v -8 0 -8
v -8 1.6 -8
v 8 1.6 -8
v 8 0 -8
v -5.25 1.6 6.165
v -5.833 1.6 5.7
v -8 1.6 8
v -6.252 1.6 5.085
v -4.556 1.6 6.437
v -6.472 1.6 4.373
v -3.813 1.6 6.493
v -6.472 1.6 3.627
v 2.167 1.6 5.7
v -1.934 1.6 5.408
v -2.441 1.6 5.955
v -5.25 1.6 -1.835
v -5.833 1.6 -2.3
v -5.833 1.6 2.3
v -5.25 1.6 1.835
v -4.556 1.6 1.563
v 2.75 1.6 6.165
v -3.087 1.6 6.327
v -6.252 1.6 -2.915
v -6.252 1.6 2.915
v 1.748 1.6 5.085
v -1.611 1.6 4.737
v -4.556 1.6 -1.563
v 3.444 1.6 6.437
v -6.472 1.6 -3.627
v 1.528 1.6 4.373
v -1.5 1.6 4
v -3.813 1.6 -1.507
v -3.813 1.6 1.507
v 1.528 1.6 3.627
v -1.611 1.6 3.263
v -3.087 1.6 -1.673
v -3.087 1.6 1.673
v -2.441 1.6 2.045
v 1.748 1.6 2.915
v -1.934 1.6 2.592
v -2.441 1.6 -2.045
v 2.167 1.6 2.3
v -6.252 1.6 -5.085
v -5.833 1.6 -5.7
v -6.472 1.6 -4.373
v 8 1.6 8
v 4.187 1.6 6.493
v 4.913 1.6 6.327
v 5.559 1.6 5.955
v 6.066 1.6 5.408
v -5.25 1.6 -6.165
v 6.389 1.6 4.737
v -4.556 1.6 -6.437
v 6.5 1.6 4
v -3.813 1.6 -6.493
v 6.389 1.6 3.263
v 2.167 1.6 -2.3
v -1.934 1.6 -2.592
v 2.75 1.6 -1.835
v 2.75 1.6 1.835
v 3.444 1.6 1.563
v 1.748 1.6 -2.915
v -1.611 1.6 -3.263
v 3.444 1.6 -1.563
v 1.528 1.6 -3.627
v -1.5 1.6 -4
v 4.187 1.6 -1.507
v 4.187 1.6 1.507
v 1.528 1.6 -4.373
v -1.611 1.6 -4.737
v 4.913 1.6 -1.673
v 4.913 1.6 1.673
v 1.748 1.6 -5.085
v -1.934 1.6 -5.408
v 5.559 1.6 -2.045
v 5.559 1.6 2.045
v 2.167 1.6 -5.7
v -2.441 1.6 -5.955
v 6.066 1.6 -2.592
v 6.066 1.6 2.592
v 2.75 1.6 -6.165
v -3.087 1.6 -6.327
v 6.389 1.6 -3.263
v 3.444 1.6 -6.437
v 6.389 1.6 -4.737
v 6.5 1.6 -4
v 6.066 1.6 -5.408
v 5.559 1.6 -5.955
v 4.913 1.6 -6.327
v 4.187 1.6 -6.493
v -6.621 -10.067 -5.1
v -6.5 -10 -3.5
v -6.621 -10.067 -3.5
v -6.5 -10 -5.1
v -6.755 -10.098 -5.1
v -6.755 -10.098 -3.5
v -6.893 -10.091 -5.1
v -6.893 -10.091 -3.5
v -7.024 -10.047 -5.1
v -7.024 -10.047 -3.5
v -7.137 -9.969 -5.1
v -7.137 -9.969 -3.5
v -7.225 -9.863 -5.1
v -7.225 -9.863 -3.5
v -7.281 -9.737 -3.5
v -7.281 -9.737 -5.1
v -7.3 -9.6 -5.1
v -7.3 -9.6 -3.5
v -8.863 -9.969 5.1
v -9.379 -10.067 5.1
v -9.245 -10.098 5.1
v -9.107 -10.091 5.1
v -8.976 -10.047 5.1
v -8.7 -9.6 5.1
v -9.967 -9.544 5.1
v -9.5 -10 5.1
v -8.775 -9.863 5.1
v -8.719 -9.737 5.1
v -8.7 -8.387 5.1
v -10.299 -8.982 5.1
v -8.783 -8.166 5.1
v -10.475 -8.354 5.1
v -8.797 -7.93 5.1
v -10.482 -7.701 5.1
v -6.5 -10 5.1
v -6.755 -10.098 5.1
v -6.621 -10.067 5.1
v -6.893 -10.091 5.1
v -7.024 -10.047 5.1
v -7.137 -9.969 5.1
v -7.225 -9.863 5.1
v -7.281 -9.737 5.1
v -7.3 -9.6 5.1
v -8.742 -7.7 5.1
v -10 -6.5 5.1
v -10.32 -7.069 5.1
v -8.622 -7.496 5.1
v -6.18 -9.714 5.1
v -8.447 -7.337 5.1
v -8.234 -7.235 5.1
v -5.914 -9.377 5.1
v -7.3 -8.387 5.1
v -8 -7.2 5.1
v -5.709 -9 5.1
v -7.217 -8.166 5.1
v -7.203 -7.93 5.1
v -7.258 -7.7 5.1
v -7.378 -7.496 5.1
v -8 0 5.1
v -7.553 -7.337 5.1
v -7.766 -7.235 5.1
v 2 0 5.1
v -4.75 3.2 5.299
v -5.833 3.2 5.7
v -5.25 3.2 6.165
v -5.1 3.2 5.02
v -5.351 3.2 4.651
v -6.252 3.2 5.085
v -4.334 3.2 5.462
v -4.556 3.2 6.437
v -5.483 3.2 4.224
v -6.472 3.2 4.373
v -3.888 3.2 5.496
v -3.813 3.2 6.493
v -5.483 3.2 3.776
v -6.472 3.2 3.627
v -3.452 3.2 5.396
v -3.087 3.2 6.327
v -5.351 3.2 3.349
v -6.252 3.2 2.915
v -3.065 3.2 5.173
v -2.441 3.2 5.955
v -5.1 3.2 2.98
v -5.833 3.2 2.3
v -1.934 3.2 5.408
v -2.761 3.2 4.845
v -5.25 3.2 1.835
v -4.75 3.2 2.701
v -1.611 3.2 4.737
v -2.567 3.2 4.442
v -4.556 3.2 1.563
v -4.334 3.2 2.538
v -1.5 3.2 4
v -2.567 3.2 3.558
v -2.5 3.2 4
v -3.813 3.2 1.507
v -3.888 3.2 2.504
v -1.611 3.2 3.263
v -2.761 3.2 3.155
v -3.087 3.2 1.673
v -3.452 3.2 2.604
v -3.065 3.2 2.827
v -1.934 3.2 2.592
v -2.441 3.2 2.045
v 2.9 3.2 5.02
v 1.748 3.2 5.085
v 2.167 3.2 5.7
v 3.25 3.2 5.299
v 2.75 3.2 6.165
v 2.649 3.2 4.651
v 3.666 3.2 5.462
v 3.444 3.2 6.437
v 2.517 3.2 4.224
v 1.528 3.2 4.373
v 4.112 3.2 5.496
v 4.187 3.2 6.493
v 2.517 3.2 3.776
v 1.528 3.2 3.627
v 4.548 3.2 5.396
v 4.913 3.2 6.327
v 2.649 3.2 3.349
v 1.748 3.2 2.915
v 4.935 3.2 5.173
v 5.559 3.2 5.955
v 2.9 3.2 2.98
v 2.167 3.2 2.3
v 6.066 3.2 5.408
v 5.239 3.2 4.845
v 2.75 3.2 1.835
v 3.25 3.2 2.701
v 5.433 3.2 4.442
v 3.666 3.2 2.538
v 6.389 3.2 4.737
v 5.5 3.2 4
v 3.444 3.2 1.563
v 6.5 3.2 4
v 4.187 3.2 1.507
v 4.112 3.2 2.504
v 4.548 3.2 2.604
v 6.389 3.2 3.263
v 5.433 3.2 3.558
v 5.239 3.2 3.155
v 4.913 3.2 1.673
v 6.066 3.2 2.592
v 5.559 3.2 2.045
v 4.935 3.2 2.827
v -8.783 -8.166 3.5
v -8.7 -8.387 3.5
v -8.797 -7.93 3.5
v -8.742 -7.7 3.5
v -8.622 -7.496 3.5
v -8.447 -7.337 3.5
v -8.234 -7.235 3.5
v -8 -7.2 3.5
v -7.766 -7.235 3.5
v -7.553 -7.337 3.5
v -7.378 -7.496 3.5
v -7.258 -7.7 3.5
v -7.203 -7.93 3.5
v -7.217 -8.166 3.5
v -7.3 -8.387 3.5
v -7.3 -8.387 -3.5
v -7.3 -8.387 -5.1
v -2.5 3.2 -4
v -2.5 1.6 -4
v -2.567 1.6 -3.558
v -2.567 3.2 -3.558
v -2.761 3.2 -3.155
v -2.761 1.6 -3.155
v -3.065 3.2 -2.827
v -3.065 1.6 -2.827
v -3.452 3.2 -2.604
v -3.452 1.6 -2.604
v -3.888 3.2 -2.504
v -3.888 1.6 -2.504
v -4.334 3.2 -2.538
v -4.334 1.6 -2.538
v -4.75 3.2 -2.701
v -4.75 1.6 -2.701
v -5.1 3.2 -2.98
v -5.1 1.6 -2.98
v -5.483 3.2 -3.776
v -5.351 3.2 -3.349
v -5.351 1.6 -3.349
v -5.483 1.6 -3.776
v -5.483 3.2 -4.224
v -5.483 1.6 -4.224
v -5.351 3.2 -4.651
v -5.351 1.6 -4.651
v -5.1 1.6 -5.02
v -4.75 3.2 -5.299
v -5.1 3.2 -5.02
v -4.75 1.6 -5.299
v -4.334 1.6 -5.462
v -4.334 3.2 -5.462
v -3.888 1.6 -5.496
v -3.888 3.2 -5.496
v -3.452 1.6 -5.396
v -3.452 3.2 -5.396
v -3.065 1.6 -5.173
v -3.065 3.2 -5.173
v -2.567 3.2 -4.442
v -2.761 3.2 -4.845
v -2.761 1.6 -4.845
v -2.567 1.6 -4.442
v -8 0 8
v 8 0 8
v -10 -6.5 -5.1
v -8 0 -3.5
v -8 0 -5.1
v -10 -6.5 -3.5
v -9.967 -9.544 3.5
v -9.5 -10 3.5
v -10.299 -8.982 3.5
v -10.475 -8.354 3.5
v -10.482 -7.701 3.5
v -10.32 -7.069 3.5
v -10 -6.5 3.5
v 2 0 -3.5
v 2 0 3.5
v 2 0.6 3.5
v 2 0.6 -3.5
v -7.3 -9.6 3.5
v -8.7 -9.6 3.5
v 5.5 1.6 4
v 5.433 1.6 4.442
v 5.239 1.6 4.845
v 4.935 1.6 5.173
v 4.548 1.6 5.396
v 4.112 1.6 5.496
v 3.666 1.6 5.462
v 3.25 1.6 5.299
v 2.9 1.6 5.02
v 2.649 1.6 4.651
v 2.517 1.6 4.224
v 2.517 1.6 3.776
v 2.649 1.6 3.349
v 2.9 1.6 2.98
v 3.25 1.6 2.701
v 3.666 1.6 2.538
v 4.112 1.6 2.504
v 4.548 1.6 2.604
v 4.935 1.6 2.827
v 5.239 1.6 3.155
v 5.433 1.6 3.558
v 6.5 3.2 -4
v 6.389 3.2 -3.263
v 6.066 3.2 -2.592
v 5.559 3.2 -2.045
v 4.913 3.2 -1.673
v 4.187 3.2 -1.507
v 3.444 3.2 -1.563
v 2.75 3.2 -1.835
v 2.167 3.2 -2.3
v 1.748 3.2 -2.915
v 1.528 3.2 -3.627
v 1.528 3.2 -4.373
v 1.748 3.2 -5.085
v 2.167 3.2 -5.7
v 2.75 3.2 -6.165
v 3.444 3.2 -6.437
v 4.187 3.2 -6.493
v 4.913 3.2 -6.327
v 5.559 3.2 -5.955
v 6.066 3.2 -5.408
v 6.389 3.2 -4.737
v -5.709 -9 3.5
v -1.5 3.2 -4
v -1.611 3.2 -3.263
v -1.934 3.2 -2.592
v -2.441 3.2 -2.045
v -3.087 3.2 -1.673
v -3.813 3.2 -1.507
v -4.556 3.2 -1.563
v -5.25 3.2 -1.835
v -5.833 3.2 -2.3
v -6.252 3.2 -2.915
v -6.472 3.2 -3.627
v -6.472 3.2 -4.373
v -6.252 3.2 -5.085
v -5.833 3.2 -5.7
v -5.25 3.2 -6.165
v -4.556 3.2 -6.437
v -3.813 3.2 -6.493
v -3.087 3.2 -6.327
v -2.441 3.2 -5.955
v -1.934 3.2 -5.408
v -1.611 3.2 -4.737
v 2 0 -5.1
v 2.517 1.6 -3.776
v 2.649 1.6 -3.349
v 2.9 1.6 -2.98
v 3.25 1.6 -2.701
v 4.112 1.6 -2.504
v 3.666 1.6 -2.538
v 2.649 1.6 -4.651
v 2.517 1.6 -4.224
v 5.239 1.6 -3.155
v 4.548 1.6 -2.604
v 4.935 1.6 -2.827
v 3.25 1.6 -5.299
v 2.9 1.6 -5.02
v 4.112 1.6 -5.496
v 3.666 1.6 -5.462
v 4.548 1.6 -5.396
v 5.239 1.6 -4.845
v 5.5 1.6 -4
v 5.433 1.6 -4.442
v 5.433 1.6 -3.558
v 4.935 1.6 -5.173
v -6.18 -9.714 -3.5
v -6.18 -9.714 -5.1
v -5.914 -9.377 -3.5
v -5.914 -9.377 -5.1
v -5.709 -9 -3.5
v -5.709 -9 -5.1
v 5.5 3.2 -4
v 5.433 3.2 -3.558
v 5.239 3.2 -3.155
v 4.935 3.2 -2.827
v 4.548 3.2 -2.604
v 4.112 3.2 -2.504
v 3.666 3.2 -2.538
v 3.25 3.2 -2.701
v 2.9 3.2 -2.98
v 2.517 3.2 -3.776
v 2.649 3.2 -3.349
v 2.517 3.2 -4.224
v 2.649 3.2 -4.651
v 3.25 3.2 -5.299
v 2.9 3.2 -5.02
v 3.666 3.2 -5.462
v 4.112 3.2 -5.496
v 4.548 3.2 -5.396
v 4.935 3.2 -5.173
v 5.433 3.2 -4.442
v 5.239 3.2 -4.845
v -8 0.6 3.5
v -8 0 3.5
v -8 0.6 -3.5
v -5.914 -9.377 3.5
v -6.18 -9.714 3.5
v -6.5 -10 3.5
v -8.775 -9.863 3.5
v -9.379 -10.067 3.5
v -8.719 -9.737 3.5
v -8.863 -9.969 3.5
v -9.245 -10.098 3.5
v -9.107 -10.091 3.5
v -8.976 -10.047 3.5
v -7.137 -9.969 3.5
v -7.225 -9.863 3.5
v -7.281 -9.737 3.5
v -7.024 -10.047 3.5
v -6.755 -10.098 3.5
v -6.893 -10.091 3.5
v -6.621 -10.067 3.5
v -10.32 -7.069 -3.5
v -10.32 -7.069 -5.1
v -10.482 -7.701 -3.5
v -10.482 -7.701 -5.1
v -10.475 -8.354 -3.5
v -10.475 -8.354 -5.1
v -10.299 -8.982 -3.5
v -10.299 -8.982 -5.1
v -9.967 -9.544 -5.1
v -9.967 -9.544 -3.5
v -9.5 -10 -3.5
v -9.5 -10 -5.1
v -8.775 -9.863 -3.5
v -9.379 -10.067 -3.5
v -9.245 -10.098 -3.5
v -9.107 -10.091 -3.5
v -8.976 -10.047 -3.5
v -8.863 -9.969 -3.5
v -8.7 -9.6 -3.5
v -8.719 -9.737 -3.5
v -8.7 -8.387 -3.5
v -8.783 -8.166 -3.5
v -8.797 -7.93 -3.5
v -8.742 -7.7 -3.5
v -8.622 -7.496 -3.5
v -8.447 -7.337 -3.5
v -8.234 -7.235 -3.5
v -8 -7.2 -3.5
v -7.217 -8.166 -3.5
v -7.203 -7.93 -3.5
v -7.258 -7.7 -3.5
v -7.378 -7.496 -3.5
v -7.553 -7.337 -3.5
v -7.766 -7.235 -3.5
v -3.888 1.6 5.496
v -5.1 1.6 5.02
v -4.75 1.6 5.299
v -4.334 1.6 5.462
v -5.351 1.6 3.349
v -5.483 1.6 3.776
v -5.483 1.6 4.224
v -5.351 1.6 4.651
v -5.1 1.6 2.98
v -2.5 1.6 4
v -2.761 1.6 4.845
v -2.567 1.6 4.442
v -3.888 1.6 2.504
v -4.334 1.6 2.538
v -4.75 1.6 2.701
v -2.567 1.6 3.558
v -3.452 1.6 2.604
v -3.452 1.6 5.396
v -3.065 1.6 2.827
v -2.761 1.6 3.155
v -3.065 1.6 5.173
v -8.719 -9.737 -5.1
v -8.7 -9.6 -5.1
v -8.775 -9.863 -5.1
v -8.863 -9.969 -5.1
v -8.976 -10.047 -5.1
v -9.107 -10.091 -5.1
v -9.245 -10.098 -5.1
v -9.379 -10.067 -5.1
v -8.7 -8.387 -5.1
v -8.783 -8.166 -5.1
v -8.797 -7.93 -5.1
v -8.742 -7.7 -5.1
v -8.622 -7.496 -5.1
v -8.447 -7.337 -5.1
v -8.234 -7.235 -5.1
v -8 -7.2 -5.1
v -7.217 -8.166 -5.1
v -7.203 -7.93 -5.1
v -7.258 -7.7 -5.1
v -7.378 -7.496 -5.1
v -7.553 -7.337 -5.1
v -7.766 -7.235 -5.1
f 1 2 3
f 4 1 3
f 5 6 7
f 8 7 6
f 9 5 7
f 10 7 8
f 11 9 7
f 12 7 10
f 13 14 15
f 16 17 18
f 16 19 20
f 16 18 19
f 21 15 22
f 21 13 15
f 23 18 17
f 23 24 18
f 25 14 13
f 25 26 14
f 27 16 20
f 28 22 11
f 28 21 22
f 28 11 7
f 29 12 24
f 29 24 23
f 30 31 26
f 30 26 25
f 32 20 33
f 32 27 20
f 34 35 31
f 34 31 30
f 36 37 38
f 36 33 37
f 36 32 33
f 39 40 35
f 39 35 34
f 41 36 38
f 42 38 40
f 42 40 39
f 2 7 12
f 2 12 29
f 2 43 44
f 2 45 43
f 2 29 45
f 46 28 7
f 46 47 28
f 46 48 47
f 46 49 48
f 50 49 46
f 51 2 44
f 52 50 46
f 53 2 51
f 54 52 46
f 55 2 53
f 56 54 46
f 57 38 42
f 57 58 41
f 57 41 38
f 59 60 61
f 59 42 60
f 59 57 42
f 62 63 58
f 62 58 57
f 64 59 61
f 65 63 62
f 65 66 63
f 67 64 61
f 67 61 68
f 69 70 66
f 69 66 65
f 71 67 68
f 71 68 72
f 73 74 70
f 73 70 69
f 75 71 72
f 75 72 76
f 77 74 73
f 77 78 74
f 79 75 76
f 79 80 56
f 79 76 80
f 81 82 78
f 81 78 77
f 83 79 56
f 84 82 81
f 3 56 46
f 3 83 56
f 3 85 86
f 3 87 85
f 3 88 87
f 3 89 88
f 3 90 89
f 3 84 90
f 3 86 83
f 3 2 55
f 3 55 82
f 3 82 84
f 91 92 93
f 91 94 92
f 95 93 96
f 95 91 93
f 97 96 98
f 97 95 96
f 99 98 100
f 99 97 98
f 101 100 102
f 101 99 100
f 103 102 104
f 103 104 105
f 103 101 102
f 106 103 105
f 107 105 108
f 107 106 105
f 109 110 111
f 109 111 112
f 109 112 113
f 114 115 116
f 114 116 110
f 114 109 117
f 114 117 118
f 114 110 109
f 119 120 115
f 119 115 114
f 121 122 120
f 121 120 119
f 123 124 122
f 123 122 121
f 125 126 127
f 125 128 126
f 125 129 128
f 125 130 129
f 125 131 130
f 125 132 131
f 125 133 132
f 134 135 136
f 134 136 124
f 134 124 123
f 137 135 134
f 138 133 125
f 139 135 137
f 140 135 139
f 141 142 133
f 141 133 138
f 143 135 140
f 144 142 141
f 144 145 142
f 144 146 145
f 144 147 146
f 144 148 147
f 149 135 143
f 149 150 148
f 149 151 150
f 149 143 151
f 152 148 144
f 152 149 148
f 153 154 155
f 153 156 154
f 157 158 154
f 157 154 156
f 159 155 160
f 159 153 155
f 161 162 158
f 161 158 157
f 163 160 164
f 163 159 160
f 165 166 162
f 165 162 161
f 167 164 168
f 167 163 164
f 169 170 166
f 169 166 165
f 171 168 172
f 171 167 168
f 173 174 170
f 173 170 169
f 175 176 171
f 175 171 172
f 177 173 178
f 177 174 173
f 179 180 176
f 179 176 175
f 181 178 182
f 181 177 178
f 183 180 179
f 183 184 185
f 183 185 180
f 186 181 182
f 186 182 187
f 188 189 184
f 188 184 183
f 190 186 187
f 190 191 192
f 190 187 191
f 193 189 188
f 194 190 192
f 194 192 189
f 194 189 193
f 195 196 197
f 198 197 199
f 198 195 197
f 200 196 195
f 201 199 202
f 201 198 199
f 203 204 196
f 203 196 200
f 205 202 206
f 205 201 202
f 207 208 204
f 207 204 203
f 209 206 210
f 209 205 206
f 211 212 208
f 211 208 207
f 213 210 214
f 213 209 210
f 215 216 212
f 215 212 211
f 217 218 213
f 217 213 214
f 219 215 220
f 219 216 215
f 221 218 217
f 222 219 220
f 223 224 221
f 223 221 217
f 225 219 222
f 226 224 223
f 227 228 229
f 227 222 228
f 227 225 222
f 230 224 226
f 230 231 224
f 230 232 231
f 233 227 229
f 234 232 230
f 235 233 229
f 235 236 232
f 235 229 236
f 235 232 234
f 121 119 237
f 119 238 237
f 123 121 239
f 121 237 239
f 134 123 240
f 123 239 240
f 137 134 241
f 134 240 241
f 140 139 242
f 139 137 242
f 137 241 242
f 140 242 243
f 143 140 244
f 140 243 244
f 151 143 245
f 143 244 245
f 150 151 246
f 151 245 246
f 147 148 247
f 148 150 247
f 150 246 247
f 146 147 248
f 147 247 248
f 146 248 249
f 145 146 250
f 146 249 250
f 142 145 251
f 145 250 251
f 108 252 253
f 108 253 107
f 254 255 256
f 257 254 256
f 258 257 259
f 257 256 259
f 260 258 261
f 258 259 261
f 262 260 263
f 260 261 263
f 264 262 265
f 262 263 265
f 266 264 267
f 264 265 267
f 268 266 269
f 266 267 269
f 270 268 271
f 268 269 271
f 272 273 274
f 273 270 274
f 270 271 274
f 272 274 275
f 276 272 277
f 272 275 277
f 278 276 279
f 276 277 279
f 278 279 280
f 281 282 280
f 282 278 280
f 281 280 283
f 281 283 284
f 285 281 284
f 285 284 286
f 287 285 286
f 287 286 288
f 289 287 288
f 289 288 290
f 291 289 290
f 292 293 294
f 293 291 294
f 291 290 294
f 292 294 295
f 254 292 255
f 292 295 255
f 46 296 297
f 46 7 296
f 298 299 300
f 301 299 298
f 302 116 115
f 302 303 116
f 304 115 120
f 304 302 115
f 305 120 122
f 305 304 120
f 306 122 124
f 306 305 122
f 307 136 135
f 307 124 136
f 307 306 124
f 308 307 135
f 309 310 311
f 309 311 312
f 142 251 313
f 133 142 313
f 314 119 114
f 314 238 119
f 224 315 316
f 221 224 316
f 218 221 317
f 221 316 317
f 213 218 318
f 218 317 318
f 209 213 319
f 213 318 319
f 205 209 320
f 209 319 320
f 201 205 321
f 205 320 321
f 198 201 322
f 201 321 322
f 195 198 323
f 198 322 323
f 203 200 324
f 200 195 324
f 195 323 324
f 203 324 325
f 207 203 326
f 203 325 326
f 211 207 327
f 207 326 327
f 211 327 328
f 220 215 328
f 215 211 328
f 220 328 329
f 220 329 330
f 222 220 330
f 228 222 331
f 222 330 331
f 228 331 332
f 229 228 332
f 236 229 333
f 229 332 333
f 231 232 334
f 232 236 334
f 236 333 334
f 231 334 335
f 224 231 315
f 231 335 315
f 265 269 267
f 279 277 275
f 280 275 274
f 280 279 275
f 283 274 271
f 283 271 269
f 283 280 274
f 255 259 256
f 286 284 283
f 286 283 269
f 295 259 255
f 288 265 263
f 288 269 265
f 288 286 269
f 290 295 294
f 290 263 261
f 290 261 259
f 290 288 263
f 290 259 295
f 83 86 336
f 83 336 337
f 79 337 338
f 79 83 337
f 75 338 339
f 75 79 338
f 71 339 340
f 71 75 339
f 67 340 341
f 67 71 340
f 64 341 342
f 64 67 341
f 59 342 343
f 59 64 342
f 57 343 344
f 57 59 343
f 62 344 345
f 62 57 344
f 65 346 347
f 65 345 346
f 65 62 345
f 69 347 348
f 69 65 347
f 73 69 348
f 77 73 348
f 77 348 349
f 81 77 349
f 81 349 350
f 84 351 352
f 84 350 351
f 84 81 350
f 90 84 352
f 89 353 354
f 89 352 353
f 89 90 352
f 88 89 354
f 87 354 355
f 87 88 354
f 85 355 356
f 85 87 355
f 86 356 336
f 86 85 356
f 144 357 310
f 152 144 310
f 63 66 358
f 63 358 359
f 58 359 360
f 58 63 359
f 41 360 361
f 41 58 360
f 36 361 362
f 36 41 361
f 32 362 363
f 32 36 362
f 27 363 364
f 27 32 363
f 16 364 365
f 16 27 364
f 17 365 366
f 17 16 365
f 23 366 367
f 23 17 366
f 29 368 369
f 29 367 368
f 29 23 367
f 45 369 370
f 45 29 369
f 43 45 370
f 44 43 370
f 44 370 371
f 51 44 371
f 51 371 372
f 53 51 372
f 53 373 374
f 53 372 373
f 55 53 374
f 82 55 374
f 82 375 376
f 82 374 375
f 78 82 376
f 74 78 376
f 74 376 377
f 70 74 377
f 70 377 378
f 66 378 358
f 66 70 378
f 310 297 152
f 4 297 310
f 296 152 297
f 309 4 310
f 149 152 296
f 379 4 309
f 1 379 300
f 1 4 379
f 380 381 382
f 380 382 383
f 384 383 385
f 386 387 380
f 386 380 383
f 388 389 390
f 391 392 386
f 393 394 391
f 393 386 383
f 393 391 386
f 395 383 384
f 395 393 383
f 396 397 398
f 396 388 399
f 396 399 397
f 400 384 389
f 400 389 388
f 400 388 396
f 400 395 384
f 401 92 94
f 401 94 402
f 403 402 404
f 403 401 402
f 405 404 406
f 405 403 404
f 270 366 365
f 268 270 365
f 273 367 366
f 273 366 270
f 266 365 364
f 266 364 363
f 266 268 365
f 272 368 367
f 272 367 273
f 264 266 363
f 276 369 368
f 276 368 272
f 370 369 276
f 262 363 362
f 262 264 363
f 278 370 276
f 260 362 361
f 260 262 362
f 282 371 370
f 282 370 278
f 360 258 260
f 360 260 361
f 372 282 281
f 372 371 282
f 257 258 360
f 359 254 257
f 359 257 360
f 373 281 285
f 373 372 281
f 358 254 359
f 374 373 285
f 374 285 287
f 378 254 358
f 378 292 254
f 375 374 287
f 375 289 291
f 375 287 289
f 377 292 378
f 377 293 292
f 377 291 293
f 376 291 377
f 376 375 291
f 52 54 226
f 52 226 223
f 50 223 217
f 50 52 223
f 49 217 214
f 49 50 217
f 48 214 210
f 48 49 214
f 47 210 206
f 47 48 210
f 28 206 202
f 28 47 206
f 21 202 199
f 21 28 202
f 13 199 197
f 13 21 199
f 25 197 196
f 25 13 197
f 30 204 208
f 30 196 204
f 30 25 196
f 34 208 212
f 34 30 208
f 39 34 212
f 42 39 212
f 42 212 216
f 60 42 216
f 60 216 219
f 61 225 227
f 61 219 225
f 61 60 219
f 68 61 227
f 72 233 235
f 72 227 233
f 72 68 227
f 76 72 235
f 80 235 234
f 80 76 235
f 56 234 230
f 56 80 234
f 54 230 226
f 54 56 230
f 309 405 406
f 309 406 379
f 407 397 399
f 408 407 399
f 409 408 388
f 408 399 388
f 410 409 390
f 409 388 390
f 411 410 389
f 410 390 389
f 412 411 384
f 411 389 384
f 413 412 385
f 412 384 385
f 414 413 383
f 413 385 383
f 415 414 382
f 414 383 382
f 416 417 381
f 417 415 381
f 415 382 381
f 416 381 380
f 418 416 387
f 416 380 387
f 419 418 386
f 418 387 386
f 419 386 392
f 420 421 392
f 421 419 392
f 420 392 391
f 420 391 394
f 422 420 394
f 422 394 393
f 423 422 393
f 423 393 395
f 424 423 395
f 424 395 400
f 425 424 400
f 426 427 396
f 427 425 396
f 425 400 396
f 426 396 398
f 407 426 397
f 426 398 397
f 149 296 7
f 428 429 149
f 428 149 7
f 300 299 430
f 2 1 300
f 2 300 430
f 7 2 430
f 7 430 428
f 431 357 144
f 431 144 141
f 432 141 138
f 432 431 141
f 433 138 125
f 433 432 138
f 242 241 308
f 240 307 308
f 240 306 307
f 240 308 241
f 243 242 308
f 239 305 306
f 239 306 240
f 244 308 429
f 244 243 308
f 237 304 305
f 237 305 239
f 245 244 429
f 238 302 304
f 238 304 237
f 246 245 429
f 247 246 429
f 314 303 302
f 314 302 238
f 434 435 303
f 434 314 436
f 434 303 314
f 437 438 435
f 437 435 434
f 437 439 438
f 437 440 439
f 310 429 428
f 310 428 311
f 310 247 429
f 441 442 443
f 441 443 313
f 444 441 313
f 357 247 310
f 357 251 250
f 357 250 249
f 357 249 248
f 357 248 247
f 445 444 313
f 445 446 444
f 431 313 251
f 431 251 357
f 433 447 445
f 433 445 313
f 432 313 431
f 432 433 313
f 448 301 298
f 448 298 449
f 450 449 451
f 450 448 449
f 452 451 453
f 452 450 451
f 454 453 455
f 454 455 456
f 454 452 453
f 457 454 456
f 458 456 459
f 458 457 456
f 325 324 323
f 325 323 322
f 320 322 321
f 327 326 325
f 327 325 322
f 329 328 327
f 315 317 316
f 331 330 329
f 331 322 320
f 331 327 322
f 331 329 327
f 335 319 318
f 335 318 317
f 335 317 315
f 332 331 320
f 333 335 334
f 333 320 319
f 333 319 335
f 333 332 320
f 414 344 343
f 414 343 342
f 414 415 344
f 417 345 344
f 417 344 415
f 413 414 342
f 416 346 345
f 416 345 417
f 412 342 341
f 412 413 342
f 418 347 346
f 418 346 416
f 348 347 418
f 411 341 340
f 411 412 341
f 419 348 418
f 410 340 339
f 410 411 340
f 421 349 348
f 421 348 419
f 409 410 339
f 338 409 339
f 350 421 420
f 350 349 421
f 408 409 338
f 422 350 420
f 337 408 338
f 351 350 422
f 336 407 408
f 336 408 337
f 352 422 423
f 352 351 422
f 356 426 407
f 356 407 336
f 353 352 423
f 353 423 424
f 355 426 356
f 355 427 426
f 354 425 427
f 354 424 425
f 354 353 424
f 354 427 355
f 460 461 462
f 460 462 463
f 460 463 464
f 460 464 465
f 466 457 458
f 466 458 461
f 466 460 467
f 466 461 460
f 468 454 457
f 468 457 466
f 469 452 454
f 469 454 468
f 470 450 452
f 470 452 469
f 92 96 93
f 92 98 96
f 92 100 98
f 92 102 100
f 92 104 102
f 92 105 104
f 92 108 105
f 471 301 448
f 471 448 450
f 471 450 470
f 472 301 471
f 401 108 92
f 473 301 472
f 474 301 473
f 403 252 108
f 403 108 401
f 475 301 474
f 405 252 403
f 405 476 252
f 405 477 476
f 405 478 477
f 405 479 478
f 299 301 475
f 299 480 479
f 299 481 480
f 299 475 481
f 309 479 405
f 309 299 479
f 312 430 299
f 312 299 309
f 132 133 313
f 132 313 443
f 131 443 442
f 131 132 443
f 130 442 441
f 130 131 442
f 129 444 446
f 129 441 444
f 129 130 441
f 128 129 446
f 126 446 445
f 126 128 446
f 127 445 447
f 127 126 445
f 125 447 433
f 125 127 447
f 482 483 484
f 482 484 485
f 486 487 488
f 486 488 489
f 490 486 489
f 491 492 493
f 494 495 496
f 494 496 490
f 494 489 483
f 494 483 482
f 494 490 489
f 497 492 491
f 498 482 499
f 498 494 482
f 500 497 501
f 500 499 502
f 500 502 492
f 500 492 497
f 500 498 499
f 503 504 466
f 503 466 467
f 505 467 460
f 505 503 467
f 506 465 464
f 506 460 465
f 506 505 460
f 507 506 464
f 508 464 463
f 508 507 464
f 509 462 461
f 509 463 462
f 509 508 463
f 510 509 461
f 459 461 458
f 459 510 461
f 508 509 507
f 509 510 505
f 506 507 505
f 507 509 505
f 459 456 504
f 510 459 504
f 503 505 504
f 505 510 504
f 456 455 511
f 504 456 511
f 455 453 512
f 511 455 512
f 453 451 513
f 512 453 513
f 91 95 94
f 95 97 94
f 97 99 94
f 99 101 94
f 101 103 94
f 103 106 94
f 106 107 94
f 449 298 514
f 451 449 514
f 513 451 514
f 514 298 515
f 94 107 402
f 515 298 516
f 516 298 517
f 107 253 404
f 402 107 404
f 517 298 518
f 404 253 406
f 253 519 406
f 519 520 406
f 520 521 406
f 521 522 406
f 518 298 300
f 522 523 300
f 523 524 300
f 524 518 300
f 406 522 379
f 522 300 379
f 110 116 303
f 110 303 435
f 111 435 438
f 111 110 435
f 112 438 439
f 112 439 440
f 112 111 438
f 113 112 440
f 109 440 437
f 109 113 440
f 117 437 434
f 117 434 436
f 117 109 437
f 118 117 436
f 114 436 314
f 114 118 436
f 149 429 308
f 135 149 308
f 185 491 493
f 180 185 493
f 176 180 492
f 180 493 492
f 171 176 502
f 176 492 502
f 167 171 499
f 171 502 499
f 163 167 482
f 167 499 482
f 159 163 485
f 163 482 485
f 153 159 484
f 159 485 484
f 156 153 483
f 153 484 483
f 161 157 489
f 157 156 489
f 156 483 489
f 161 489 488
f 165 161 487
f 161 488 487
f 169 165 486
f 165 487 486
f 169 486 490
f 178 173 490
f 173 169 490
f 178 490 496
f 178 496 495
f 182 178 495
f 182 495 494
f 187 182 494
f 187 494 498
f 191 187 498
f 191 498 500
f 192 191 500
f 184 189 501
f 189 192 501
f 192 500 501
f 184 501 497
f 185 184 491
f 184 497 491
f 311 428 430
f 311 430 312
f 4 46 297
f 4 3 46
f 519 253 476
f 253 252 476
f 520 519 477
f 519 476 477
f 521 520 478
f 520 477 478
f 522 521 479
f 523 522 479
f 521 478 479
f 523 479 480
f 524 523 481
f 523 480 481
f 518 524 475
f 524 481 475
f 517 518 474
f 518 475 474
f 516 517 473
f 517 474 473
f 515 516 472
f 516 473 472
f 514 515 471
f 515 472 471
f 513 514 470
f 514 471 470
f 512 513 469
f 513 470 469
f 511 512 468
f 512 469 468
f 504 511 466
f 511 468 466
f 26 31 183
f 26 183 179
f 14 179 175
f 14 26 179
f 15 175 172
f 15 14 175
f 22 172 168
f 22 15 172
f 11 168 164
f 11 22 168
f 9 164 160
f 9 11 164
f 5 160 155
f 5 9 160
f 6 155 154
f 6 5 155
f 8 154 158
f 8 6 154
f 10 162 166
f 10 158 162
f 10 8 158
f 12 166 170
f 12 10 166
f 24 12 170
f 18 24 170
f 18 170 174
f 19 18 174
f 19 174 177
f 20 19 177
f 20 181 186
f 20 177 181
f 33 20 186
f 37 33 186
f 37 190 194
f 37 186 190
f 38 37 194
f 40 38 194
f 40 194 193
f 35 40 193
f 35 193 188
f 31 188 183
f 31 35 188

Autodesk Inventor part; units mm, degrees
ref_plane "YZ Plane" through (0, 0, 0) normal (1, 0, 0) x (0, 1, 0)
sketch "Sketch1" plane through (0, 0, 0) normal (0, 0, 1) x (1, 0, 0)
  line L0 (-8, 1.6) -> (8, 1.6)
  line L1 (8, 1.6) -> (8, 0)
  line L2 (8, 0) -> (-8, 0)
  line L3 (-8, 0) -> (-8, 1.6)
  arc A0 (-7.3, -8.3873) -> (-8.7, -8.3873) centre (-8, -8) ccw
  line L4 (-8.7, -8.3873) -> (-8.7, -10.4)
  line L5 (-7.3, -8.3873) -> (-7.3, -10.4)
  line L6 (-8, 0) -> (-10, -6.5)
  line L7 (-5.7087, -9) -> (2, 0)
  arc A1 (-7.3, -10.4) -> (-5.7087, -9) centre (-8, -8) ccw
  arc A2 (-10, -6.5) -> (-8.7, -10.4) centre (-8, -8) ccw
  point P0 (0, 0)
  point P1 (0, 0)
  dimension "d0" = 1.6
  dimension "d1" = 16
  dimension "d3" = 9.6
  dimension "d4" = 1.6
  dimension "d6" = 1.4
  dimension "d7" = 0.7
  dimension "d8" = 1
  dimension "d9" = 1.5
  dimension "d10" = 2.5
  dimension "d11" = 2.5
  dimension "d12" = 10
extrude "Extrusion1" add sketch "Sketch1" along normal mid plane 16 contours L0 L1 L2 L3
ref_plane "Work Plane1" through (0, 0, -3.5) normal (0, 0, 1) x (1, 0, 0)
ref_plane "Work Plane2" through (0, 0, 3.5) normal (0, 0, 1) x (1, 0, 0)
sketch "Sketch2" plane through (0, 0, 3.5) normal (0, 0, 1) x (1, 0, 0)
  line L0 (-8, 0) -> (-10, -6.5) projected
  arc A0 (-10, -6.5) -> (-8.7, -10.4) centre (-8, -8) ccw projected
  line L1 (-8.7, -8.3873) -> (-8.7, -10.4) projected
  arc A1 (-7.3, -8.3873) -> (-8.7, -8.3873) centre (-8, -8) ccw projected
  line L2 (-7.3, -8.3873) -> (-7.3, -10.4) projected
  arc A2 (-7.3, -10.4) -> (-5.7087, -9) centre (-8, -8) ccw projected
  line L3 (-5.7087, -9) -> (2, 0) projected
  line L4 (8, 0) -> (-8, 0) projected
  point P0 (0, 0)
extrude "Extrusion2" add sketch "Sketch2" along normal blind 1.6
sketch "Sketch3" plane through (0, 0, -3.5) normal (0, 0, 1) x (1, 0, 0)
  line L0 (-8, 0) -> (-10, -6.5) projected
  arc A0 (-10, -6.5) -> (-8.7, -10.4) centre (-8, -8) ccw projected
  line L1 (-8.7, -8.3873) -> (-8.7, -10.4) projected
  arc A1 (-7.3, -8.3873) -> (-8.7, -8.3873) centre (-8, -8) ccw projected
  line L2 (-7.3, -8.3873) -> (-7.3, -10.4) projected
  arc A2 (-7.3, -10.4) -> (-5.7087, -9) centre (-8, -8) ccw projected
  line L3 (-5.7087, -9) -> (2, 0) projected
  line L4 (8, 0) -> (-8, 0) projected
  point P0 (0, 0)
extrude "Extrusion3" add sketch "Sketch3" against normal blind 1.6
fillet "Fillet1" radius 0.5 4 edges at (-8.7, -10.4, 4.3) (-7.3, -10.4, 4.3) (-7.3, -10.4, -4.3) (-8.7, -10.4, -4.3)
sketch "Sketch4" plane through (-8, 1.6, 8) normal (0, 1, 0) x (1, 0, 0)
  line L0 (16, 16) -> (0, 16) projected
  line L1 (0, 0) -> (0, 16) projected
  circle A0 centre (4, 12) radius 2.5
  circle A1 centre (12, 12) radius 2.5
  circle A2 centre (12, 4) radius 2.5
  circle A3 centre (4, 4) radius 2.5
  circle A4 centre (4, 12) radius 1.5
  circle A5 centre (12, 12) radius 1.5
  circle A6 centre (12, 4) radius 1.5
  circle A7 centre (4, 4) radius 1.5
  point P0 (8, 8)
  dimension "d22" = 8
  dimension "d23" = 8
  dimension "d24" = 4
  dimension "d25" = 4
  dimension "d26" = 5
  dimension "d27" = 3
extrude "Extrusion4" add sketch "Sketch4" along normal blind 1.6
sketch "Sketch5" plane through (-8, 0, -8) normal (0, -1, 0) x (1, 0, 0)
  line L0 (0, 11.5) -> (10, 11.5)
  line L1 (10, 11.5) -> (10, 4.5)
  line L2 (10, 4.5) -> (0, 4.5)
  line L3 (0, 4.5) -> (0, 11.5)
  point P0 (8, 8)
extrude "Extrusion5" cut sketch "Sketch5" against normal blind 0.6
equation "\"d7\" = 0.5 * d6"
properties part number "2415" material "Steel"
